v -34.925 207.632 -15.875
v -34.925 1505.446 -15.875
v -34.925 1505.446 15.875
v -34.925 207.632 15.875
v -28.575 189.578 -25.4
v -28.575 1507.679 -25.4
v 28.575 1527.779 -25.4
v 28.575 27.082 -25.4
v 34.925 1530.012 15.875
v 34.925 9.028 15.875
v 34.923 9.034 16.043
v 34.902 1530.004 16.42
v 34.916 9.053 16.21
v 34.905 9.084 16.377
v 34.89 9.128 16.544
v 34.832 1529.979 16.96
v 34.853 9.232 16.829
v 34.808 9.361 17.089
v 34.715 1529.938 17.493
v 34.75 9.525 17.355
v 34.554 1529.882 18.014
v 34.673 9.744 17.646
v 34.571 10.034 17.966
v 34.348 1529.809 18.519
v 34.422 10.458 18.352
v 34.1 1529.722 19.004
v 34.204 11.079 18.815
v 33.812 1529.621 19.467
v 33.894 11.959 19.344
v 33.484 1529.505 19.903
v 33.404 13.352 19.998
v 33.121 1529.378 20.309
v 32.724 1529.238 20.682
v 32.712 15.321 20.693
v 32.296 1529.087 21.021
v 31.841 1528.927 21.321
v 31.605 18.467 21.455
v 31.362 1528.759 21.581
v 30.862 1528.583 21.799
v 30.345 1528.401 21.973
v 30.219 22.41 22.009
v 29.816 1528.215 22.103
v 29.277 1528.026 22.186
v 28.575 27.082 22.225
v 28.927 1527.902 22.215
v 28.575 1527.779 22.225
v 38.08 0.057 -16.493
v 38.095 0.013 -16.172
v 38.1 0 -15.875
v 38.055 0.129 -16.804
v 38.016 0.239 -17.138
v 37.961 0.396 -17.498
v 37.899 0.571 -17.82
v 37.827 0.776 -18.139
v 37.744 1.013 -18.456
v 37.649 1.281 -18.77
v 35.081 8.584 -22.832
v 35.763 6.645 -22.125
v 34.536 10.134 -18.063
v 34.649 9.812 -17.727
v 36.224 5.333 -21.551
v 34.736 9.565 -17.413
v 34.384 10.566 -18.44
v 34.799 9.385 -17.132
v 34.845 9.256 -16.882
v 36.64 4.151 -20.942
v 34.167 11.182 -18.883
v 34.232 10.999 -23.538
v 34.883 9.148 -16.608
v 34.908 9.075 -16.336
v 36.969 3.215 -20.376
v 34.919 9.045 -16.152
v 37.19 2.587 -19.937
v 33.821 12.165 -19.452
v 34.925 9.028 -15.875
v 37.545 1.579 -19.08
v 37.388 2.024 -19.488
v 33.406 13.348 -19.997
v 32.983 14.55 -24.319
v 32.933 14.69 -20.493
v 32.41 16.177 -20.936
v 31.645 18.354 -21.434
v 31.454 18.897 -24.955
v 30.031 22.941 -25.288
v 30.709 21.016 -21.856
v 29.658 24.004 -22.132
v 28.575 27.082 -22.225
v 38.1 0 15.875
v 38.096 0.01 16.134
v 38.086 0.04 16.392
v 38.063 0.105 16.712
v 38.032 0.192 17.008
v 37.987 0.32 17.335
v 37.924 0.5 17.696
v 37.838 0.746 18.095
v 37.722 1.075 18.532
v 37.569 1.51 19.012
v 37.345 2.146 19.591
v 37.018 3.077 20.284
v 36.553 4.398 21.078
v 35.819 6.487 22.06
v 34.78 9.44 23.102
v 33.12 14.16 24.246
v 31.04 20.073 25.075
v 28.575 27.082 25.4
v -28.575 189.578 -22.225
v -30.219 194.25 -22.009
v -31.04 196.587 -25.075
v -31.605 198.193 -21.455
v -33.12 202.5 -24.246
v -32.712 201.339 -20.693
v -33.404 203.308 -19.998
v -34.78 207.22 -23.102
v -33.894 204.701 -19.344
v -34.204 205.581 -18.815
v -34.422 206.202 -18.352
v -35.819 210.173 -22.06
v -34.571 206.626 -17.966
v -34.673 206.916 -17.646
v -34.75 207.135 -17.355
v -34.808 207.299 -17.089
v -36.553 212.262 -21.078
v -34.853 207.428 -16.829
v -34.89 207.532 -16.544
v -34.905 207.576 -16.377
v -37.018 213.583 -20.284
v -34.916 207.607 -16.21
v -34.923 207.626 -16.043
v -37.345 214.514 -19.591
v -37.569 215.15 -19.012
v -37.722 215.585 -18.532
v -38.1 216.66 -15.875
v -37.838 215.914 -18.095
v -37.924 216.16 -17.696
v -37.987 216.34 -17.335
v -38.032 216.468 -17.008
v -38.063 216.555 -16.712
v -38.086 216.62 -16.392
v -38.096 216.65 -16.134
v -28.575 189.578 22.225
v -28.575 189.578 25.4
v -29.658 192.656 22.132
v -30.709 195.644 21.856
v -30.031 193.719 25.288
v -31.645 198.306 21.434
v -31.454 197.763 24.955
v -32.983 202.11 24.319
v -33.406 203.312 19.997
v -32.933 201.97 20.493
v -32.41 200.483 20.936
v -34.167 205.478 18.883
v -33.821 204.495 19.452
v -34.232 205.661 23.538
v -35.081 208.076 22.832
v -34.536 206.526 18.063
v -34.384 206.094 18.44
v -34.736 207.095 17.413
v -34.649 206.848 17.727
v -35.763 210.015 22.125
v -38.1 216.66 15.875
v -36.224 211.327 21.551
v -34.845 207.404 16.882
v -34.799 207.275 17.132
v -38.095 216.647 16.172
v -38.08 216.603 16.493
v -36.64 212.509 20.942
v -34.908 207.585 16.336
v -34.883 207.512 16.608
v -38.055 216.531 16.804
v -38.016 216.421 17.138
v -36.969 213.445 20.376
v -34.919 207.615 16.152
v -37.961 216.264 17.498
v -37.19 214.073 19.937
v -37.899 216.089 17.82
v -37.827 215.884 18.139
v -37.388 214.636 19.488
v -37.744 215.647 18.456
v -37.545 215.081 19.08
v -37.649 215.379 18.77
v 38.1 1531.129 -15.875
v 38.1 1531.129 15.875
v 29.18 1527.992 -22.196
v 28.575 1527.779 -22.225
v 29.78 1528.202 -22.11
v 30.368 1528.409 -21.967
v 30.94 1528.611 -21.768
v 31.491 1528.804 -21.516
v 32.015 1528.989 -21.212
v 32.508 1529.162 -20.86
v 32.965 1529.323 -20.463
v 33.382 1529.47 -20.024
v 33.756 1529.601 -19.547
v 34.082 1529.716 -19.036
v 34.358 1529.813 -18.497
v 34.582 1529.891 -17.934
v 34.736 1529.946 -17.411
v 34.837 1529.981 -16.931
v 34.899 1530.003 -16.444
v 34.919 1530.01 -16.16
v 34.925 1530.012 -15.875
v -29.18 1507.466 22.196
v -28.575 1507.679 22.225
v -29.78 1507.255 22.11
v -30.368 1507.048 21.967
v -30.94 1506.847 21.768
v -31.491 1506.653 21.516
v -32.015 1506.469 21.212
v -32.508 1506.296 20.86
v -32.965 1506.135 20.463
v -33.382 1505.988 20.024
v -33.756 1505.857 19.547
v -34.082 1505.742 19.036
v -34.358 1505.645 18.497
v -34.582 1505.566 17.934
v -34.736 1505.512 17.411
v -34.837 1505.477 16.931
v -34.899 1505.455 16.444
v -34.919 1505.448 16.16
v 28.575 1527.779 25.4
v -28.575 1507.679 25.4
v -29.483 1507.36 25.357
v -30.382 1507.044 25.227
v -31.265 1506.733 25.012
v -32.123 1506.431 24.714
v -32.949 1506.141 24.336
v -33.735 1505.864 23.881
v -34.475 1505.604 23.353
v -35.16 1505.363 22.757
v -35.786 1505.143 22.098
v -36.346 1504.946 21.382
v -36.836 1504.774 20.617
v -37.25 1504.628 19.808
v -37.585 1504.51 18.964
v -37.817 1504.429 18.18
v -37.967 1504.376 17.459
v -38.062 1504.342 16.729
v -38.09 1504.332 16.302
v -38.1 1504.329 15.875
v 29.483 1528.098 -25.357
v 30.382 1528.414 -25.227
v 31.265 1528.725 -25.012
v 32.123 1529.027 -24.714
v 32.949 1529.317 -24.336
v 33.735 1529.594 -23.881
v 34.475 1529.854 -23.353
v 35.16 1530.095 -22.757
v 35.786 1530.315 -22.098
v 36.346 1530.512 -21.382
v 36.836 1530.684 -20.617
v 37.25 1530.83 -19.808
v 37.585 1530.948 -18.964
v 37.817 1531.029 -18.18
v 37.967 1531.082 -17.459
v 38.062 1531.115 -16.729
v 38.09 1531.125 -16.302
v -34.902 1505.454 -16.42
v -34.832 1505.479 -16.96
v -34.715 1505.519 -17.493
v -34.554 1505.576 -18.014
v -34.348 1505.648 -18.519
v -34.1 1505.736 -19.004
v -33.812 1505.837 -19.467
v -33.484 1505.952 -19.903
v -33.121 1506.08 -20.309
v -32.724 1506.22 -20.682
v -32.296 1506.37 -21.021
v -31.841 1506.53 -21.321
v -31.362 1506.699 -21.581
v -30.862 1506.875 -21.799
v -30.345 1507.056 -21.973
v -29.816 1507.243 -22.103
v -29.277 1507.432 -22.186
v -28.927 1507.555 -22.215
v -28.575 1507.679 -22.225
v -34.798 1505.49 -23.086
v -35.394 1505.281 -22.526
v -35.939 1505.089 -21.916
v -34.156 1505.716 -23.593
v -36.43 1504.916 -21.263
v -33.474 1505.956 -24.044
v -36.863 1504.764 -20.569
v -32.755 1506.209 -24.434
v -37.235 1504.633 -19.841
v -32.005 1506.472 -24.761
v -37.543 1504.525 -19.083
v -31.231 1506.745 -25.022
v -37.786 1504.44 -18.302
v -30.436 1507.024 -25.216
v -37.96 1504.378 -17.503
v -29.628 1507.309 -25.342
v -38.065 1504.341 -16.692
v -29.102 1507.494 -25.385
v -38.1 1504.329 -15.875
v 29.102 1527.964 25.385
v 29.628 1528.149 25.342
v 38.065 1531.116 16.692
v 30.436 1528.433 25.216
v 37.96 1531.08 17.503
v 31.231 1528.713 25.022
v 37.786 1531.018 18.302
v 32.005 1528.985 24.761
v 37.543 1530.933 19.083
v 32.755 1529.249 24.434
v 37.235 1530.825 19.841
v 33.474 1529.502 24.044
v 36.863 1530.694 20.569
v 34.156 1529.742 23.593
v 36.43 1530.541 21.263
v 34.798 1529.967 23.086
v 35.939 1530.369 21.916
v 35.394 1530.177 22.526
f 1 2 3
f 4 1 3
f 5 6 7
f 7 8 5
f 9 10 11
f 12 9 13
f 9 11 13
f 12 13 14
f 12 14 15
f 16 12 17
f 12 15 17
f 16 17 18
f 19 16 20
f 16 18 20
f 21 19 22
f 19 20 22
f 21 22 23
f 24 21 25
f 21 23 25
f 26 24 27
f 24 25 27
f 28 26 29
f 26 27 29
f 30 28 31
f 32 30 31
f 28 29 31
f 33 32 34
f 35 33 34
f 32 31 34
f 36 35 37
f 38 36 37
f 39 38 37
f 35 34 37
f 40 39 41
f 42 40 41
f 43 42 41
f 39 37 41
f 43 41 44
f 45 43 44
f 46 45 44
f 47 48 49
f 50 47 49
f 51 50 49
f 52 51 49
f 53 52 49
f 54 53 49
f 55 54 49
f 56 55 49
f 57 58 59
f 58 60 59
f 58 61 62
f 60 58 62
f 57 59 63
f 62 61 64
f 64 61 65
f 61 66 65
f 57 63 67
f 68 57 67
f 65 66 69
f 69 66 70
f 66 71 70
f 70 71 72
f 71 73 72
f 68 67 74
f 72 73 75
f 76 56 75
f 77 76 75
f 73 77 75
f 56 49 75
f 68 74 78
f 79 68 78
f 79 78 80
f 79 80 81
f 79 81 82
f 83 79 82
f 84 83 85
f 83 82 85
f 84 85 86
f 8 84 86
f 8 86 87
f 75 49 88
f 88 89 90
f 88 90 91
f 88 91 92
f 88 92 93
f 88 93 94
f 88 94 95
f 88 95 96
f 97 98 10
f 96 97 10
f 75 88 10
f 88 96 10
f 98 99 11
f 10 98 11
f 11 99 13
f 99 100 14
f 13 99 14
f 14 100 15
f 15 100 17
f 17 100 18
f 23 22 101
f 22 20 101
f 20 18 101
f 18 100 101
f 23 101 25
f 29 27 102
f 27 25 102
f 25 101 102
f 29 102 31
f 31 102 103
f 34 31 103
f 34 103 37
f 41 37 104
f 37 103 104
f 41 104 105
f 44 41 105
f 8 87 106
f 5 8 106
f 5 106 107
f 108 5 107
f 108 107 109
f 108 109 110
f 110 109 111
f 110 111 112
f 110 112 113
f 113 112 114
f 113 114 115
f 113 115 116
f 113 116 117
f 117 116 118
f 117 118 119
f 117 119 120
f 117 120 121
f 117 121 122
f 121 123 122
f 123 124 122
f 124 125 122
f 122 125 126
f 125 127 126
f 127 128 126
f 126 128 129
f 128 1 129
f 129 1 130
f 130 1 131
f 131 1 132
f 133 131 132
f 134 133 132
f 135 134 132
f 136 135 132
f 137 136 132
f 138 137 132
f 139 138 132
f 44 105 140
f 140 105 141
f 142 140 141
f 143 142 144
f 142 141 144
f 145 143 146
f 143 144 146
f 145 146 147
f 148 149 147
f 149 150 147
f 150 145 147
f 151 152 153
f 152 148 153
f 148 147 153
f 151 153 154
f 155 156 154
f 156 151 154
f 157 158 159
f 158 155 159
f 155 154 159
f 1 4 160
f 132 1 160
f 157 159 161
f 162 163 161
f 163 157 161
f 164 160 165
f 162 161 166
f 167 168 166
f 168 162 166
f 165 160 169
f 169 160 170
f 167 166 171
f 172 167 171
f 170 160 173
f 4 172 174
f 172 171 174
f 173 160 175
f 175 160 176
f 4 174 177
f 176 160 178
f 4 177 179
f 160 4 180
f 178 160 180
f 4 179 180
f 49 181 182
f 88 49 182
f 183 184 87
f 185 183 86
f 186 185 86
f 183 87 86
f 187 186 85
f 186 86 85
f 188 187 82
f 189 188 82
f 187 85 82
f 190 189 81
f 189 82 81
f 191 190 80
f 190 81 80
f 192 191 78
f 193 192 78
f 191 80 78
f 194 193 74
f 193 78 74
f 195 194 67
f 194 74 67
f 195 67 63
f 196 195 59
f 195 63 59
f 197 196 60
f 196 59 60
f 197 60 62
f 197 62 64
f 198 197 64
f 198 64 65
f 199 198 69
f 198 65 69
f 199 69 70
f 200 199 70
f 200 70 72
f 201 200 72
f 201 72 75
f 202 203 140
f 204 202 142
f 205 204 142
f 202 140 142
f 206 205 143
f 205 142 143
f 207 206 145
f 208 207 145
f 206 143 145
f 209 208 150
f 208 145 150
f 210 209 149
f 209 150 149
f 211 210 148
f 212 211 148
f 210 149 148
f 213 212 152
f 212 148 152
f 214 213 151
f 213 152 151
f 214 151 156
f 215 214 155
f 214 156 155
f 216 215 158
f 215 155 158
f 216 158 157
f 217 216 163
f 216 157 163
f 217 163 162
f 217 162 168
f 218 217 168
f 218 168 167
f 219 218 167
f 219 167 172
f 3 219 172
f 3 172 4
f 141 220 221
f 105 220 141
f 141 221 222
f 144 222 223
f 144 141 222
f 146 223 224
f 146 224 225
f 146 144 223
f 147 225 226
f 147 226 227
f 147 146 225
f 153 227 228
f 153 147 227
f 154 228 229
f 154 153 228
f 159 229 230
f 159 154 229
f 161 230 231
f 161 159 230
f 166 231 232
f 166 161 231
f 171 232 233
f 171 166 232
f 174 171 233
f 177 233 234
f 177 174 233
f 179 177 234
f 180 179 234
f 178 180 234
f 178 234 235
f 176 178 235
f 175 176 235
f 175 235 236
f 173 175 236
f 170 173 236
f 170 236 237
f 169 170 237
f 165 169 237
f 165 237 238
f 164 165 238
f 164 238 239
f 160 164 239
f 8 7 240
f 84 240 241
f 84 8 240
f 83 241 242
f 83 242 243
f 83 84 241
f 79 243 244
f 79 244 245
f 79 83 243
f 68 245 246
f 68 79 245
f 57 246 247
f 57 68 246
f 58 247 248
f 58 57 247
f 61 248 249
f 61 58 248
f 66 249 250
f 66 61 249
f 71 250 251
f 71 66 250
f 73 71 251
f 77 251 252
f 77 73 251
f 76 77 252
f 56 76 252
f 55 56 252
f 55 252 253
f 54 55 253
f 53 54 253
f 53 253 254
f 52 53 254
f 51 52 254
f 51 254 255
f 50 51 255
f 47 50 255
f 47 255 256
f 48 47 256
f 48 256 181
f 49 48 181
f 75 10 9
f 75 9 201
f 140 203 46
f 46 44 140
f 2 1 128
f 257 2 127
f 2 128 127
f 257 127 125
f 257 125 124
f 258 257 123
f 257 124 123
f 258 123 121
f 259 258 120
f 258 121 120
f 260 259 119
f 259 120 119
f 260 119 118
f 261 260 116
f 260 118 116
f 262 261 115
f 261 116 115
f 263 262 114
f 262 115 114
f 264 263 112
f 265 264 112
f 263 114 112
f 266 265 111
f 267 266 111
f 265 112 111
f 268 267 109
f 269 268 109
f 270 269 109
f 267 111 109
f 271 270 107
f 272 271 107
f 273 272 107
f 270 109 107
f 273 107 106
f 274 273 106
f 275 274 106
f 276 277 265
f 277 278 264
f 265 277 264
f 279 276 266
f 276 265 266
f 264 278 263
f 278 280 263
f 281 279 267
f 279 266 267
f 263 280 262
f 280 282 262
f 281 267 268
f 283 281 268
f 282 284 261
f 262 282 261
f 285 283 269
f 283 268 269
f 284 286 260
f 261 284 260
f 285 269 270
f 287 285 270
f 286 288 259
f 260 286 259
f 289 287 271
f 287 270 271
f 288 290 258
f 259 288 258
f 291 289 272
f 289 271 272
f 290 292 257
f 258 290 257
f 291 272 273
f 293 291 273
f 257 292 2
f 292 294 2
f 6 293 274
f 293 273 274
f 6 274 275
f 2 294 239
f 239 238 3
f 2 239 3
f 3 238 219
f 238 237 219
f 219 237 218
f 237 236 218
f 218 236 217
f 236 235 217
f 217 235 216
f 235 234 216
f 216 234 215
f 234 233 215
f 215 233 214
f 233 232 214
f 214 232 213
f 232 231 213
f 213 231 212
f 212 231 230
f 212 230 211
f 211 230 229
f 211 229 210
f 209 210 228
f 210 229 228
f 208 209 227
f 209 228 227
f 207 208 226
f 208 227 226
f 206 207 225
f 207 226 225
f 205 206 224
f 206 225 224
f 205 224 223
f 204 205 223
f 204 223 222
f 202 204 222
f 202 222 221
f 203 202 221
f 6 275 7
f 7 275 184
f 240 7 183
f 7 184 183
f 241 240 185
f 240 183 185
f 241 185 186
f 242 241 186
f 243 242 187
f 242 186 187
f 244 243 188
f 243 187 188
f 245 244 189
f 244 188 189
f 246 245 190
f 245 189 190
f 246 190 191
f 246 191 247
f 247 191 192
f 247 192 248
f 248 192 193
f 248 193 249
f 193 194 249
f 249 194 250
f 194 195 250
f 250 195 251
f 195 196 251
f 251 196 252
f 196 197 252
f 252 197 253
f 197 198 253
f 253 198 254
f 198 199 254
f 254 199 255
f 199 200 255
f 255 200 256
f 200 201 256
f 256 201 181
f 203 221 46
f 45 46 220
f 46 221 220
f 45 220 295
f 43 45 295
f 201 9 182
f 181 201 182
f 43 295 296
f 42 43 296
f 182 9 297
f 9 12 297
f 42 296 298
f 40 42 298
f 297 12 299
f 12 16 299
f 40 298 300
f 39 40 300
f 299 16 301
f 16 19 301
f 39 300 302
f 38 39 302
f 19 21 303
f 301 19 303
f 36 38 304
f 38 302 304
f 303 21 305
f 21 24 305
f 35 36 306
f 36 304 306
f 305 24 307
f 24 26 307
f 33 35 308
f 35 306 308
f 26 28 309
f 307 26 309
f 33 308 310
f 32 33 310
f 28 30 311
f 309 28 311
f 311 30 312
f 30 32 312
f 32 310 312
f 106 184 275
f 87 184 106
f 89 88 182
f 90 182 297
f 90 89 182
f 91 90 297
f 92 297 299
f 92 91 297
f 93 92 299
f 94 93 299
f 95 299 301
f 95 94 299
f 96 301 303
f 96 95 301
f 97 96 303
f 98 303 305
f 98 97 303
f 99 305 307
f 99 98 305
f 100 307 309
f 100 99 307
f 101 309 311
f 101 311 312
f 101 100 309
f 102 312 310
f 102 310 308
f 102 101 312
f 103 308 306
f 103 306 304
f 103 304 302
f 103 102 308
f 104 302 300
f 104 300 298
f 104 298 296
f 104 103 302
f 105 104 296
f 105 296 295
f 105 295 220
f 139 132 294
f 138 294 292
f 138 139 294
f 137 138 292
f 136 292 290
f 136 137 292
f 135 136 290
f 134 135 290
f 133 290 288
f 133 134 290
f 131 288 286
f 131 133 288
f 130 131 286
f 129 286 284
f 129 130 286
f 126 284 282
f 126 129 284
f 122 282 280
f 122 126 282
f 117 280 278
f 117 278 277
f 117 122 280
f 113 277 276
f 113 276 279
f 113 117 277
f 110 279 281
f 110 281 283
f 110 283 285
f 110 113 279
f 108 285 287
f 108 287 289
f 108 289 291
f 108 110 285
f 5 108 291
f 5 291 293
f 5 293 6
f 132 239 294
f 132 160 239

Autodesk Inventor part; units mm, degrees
ref_plane "YZ Plane" through (0, 0, 0) normal (1, 0, 0) x (0, 1, 0)
ref_plane "XZ Plane" through (0, 0, 0) normal (0, 1, 0) x (-1, 0, 0)
ref_plane "XY Plane" through (0, 0, 0) normal (0, 0, 1) x (1, 0, 0)
sketch "Sketch1" plane through (0, 0, 0) normal (0, 1, 0) x (-1, 0, 0)
  line L0 (-28.575, 25.4) -> (28.575, 25.4)
  line L1 (38.1, 15.875) -> (38.1, -15.875)
  line L2 (28.575, -25.4) -> (-28.575, -25.4)
  line L3 (-38.1, -15.875) -> (-38.1, 15.875)
  line L4 (-38.1, 25.4) -> (38.1, -25.4) construction
  line L5 (38.1, 25.4) -> (-38.1, -25.4) construction
  arc A0 (38.1, 15.875) -> (28.575, 25.4) centre (28.575, 15.875) ccw
  arc A1 (-28.575, 25.4) -> (-38.1, 15.875) centre (-28.575, 15.875) ccw
  arc A2 (-38.1, -15.875) -> (-28.575, -25.4) centre (-28.575, -15.875) ccw
  arc A3 (28.575, -25.4) -> (38.1, -15.875) centre (28.575, -15.875) ccw
  line L6 (34.925, -15.875) -> (34.925, 15.875)
  arc A4 (34.925, 15.875) -> (28.575, 22.225) centre (28.575, 15.875) ccw
  line L7 (28.575, 22.225) -> (-28.575, 22.225)
  arc A5 (-28.575, 22.225) -> (-34.925, 15.875) centre (-28.575, 15.875) ccw
  line L8 (-34.925, 15.875) -> (-34.925, -15.875)
  arc A6 (-34.925, -15.875) -> (-28.575, -22.225) centre (-28.575, -15.875) ccw
  line L9 (-28.575, -22.225) -> (28.575, -22.225)
  arc A7 (28.575, -22.225) -> (34.925, -15.875) centre (28.575, -15.875) ccw
  point P0 (0, 0)
  dimension "d0" = 76.2
  dimension "d1" = 50.8
  dimension "d2" = 9.525
  dimension "d3" = 3.175
extrude "Extrusion1" add sketch "Sketch1" along normal blind 1531.1288
sketch "Sketch2" plane through (-28.575, 0, 25.4) normal (0, 0, 1) x (1, 0, 0)
  line L0 (66.675, 0) -> (66.675, 1531.1288) projected
  line L1 (66.675, 0) -> (-9.525, 216.66)
  line L2 (-9.525, 0) -> (-9.525, 1531.1288) projected
  line L3 (0, 0) -> (-9.525, 0) projected
  line L4 (-9.525, 216.66) -> (-9.525, 0)
  line L5 (-9.525, 0) -> (66.675, 0)
  line L6 (66.675, 1531.1288) -> (57.15, 1531.1288) projected
  line L7 (66.675, 1531.1288) -> (-9.525, 1531.1288)
  line L8 (0, 1531.1288) -> (-9.525, 1531.1288) projected
  line L9 (-9.525, 1531.1288) -> (-9.525, 1504.329)
  line L10 (-9.525, 1504.329) -> (66.675, 1531.1288)
  point P0 (28.575, 0)
  dimension "d10" = 19.377
  dimension "d12" = 19.377
extrude "Extrusion2" cut sketch "Sketch2" against normal through all contours L5 L3 L2 L1 | L10 L2 L7 L6
equation "\"d0\" = stockWidth"
equation "\"d1\" = stockHeight"
equation "\"d2\" = stockRad"
equation "\"d3\" = stockGuage"
equation "\"d4\" = supSideLen"
equation "\"d10\" = supSideAng"
equation "\"d12\" = supSideAng"
equation "\"height\" = 203.2"
equation "\"shaftDiam\" = 6.35"
equation "\"shaftSpace\" = 1.5875"
equation "\"stageSpace\" = 2.54"
equation "\"stageAngle\" = 15deg"
equation "\"stockHeight\" = 50.8"
equation "\"stockWidth\" = 76.2"
equation "\"stockRad\" = 9.525"
equation "\"stockGuage\" = 3.175"
equation "\"groundActu\" = 304.8"
equation "\"baseWidth\" = 1066.8"
equation "\"baseDepth\" = 254"
equation "\"capThickness\" = 3.175"
equation "\"sup1Len\" = 660.4"
equation "\"sup1Ang\" = 22.619865deg"
equation "\"sup2Len\" = 2079.37366"
equation "\"sup2Ang\" = 8.959949deg"
equation "\"supVertLen\" = 955.13561"
equation "\"supSideLen\" = 1531.12879"
equation "\"supSideAng\" = 19.3769deg"
equation "\"FlangeDiam\" = 12.7"
equation "\"bearingDiam\" = 9.5504"
equation "\"FlangeDepth\" = 1.5875"
equation "\"smallFilet\" = 0.39687"
equation "\"thickness\" = 12.7"
equation "\"ringDiam\" = 96.46608"
properties part number "side support" material "Aluminum 6061"
